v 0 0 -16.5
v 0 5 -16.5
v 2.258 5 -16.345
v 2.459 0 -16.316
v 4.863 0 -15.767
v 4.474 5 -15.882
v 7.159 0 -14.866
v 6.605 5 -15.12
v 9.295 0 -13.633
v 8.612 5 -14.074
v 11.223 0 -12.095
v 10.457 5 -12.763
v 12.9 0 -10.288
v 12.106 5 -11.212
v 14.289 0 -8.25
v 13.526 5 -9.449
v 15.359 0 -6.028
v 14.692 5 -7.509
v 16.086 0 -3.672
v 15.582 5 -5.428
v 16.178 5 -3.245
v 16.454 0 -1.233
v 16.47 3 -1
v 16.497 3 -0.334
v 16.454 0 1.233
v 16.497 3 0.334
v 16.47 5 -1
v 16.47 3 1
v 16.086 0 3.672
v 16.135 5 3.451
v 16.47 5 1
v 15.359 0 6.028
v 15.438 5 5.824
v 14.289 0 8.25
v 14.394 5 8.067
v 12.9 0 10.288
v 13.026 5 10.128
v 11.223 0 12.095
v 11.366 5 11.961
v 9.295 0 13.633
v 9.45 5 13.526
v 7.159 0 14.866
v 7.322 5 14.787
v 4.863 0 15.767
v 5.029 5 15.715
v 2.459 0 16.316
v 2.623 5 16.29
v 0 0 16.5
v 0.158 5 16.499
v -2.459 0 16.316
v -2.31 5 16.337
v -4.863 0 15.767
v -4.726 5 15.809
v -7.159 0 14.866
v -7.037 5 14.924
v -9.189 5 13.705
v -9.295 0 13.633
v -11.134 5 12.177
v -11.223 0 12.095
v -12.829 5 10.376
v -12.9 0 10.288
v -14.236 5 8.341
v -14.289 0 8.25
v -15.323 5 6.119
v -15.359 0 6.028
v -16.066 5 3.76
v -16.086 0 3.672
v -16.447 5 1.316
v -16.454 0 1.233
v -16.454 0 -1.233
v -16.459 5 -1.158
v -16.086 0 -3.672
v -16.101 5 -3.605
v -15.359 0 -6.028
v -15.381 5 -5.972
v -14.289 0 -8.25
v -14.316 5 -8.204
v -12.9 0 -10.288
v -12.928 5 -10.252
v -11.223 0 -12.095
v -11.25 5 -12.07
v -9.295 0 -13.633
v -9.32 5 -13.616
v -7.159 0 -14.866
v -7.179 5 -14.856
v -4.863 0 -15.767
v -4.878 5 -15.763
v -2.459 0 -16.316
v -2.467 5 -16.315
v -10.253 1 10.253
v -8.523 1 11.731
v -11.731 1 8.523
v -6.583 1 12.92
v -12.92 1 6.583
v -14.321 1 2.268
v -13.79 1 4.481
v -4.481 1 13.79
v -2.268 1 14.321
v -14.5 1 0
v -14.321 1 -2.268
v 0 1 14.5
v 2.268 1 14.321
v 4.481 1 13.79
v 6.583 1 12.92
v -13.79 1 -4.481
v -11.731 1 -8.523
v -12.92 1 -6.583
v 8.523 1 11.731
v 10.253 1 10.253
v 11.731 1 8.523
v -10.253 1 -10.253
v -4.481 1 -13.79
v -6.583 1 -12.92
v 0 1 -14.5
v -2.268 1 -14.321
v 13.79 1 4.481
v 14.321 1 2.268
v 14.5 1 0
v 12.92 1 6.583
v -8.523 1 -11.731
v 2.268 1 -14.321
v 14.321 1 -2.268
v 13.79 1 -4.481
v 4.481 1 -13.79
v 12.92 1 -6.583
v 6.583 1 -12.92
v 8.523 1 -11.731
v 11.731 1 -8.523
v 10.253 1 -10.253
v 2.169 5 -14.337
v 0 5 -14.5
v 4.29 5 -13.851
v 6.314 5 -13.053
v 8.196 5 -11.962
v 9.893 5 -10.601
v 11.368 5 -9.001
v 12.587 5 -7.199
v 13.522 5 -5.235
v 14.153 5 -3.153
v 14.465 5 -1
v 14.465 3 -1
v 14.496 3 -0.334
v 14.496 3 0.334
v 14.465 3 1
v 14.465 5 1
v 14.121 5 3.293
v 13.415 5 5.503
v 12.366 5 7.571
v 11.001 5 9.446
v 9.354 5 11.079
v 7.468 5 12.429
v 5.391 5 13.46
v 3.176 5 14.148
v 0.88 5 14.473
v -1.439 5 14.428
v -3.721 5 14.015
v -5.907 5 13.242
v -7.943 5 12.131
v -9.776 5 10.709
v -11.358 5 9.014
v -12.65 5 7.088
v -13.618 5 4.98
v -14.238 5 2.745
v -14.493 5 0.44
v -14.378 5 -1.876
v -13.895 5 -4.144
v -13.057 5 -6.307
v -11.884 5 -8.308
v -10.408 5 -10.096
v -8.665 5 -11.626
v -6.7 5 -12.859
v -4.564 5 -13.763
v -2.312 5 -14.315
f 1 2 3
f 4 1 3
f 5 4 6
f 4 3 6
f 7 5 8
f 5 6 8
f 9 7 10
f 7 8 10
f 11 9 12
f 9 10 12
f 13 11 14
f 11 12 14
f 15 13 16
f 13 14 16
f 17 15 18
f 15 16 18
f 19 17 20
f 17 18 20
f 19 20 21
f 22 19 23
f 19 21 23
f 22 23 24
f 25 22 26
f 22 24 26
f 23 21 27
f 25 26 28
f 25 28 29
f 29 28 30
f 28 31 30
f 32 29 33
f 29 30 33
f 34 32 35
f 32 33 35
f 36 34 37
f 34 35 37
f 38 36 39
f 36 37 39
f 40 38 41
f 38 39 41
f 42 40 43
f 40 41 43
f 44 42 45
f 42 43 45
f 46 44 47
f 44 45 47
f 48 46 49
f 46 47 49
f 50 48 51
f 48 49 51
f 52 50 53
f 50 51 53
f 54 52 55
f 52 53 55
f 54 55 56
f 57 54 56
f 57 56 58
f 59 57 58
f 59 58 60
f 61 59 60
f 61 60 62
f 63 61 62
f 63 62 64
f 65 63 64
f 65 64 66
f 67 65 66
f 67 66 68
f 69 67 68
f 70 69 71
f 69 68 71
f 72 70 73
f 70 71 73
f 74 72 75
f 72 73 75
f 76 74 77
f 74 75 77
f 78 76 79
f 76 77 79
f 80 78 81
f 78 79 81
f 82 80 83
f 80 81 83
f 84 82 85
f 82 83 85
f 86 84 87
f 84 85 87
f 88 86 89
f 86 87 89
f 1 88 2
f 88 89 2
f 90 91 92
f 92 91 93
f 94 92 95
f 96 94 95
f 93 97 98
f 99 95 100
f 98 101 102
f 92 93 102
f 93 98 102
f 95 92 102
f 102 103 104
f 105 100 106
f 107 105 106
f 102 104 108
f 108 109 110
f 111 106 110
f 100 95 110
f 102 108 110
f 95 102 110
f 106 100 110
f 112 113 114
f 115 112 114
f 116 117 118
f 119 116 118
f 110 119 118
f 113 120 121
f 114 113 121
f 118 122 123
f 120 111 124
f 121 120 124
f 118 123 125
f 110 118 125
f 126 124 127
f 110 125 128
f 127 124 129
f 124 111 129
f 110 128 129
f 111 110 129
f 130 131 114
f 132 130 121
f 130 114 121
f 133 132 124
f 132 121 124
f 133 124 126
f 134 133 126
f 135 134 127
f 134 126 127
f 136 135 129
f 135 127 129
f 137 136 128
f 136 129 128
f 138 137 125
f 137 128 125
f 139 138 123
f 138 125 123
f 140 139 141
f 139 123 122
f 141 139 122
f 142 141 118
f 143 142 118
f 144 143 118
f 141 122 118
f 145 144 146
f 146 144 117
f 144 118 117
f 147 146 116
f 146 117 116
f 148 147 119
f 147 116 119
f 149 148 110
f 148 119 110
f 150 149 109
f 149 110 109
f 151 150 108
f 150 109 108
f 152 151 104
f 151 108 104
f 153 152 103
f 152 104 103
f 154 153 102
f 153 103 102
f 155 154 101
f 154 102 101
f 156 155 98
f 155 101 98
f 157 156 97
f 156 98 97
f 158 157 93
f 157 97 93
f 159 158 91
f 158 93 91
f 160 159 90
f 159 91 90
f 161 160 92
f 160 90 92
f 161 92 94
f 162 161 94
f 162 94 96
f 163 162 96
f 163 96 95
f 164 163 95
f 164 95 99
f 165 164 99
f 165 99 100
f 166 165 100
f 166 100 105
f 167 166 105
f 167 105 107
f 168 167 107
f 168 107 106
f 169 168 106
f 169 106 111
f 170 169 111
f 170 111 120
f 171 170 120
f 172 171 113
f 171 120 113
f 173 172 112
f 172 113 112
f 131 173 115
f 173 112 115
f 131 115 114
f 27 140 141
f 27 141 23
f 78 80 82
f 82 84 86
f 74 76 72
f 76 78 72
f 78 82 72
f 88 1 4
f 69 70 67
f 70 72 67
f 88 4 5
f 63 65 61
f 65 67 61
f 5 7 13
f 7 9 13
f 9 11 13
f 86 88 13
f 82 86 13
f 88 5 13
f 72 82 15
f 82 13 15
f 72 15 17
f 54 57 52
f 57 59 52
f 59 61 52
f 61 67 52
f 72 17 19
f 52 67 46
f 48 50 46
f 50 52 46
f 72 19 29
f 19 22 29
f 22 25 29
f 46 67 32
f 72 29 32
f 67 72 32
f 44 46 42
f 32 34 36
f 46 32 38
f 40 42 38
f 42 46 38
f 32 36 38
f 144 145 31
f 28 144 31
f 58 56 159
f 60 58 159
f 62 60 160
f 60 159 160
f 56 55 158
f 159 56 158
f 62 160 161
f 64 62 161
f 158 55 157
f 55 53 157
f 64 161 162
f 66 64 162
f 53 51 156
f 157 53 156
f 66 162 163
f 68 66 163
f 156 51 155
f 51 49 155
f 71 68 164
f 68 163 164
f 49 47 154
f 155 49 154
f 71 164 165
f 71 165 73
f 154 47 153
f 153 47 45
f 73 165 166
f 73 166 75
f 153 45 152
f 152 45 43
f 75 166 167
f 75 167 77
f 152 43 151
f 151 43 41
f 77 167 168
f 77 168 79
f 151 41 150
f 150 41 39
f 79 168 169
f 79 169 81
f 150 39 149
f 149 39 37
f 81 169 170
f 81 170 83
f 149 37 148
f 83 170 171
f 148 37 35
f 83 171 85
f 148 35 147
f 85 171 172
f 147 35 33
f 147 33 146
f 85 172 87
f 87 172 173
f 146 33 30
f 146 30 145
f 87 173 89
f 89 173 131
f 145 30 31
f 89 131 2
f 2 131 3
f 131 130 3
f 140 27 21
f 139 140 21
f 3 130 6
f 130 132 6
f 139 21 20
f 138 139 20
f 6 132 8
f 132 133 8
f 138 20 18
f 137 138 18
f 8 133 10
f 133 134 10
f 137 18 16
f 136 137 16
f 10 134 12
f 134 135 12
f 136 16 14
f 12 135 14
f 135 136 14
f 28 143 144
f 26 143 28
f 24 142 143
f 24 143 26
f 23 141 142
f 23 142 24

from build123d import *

# Parameters (mm, degrees)
SKETCH_2_W          = 2.034523859
SKETCH_2_H          = 2
CUT_EXTRUDE_1_DEPTH = 2


with BuildPart() as part:
    # Эскиз1 → Повернуть1 (revolve)
    with BuildSketch(Plane(origin=(0, 0, 0), x_dir=(0, 0, -1), z_dir=(1, 0, 0))):
        Polygon((0, 0), (16.5, 0), (16.5, 5), (14.5, 5), (14.5, 1), (0, 1), align=None)
    revolve(axis=Axis((0, 1, 0), (0, -1, 0)))

    # Эскиз2 → Вырез-Вытянуть1 (cut)
    with BuildSketch(Plane(origin=(0, 5, 0), x_dir=(1, 0, 0), z_dir=(0, 1, 0))):
        with Locations((15.482738071, 0)):
            Rectangle(SKETCH_2_W, SKETCH_2_H)
    extrude(amount=-CUT_EXTRUDE_1_DEPTH, mode=Mode.SUBTRACT)


solid = part.part
